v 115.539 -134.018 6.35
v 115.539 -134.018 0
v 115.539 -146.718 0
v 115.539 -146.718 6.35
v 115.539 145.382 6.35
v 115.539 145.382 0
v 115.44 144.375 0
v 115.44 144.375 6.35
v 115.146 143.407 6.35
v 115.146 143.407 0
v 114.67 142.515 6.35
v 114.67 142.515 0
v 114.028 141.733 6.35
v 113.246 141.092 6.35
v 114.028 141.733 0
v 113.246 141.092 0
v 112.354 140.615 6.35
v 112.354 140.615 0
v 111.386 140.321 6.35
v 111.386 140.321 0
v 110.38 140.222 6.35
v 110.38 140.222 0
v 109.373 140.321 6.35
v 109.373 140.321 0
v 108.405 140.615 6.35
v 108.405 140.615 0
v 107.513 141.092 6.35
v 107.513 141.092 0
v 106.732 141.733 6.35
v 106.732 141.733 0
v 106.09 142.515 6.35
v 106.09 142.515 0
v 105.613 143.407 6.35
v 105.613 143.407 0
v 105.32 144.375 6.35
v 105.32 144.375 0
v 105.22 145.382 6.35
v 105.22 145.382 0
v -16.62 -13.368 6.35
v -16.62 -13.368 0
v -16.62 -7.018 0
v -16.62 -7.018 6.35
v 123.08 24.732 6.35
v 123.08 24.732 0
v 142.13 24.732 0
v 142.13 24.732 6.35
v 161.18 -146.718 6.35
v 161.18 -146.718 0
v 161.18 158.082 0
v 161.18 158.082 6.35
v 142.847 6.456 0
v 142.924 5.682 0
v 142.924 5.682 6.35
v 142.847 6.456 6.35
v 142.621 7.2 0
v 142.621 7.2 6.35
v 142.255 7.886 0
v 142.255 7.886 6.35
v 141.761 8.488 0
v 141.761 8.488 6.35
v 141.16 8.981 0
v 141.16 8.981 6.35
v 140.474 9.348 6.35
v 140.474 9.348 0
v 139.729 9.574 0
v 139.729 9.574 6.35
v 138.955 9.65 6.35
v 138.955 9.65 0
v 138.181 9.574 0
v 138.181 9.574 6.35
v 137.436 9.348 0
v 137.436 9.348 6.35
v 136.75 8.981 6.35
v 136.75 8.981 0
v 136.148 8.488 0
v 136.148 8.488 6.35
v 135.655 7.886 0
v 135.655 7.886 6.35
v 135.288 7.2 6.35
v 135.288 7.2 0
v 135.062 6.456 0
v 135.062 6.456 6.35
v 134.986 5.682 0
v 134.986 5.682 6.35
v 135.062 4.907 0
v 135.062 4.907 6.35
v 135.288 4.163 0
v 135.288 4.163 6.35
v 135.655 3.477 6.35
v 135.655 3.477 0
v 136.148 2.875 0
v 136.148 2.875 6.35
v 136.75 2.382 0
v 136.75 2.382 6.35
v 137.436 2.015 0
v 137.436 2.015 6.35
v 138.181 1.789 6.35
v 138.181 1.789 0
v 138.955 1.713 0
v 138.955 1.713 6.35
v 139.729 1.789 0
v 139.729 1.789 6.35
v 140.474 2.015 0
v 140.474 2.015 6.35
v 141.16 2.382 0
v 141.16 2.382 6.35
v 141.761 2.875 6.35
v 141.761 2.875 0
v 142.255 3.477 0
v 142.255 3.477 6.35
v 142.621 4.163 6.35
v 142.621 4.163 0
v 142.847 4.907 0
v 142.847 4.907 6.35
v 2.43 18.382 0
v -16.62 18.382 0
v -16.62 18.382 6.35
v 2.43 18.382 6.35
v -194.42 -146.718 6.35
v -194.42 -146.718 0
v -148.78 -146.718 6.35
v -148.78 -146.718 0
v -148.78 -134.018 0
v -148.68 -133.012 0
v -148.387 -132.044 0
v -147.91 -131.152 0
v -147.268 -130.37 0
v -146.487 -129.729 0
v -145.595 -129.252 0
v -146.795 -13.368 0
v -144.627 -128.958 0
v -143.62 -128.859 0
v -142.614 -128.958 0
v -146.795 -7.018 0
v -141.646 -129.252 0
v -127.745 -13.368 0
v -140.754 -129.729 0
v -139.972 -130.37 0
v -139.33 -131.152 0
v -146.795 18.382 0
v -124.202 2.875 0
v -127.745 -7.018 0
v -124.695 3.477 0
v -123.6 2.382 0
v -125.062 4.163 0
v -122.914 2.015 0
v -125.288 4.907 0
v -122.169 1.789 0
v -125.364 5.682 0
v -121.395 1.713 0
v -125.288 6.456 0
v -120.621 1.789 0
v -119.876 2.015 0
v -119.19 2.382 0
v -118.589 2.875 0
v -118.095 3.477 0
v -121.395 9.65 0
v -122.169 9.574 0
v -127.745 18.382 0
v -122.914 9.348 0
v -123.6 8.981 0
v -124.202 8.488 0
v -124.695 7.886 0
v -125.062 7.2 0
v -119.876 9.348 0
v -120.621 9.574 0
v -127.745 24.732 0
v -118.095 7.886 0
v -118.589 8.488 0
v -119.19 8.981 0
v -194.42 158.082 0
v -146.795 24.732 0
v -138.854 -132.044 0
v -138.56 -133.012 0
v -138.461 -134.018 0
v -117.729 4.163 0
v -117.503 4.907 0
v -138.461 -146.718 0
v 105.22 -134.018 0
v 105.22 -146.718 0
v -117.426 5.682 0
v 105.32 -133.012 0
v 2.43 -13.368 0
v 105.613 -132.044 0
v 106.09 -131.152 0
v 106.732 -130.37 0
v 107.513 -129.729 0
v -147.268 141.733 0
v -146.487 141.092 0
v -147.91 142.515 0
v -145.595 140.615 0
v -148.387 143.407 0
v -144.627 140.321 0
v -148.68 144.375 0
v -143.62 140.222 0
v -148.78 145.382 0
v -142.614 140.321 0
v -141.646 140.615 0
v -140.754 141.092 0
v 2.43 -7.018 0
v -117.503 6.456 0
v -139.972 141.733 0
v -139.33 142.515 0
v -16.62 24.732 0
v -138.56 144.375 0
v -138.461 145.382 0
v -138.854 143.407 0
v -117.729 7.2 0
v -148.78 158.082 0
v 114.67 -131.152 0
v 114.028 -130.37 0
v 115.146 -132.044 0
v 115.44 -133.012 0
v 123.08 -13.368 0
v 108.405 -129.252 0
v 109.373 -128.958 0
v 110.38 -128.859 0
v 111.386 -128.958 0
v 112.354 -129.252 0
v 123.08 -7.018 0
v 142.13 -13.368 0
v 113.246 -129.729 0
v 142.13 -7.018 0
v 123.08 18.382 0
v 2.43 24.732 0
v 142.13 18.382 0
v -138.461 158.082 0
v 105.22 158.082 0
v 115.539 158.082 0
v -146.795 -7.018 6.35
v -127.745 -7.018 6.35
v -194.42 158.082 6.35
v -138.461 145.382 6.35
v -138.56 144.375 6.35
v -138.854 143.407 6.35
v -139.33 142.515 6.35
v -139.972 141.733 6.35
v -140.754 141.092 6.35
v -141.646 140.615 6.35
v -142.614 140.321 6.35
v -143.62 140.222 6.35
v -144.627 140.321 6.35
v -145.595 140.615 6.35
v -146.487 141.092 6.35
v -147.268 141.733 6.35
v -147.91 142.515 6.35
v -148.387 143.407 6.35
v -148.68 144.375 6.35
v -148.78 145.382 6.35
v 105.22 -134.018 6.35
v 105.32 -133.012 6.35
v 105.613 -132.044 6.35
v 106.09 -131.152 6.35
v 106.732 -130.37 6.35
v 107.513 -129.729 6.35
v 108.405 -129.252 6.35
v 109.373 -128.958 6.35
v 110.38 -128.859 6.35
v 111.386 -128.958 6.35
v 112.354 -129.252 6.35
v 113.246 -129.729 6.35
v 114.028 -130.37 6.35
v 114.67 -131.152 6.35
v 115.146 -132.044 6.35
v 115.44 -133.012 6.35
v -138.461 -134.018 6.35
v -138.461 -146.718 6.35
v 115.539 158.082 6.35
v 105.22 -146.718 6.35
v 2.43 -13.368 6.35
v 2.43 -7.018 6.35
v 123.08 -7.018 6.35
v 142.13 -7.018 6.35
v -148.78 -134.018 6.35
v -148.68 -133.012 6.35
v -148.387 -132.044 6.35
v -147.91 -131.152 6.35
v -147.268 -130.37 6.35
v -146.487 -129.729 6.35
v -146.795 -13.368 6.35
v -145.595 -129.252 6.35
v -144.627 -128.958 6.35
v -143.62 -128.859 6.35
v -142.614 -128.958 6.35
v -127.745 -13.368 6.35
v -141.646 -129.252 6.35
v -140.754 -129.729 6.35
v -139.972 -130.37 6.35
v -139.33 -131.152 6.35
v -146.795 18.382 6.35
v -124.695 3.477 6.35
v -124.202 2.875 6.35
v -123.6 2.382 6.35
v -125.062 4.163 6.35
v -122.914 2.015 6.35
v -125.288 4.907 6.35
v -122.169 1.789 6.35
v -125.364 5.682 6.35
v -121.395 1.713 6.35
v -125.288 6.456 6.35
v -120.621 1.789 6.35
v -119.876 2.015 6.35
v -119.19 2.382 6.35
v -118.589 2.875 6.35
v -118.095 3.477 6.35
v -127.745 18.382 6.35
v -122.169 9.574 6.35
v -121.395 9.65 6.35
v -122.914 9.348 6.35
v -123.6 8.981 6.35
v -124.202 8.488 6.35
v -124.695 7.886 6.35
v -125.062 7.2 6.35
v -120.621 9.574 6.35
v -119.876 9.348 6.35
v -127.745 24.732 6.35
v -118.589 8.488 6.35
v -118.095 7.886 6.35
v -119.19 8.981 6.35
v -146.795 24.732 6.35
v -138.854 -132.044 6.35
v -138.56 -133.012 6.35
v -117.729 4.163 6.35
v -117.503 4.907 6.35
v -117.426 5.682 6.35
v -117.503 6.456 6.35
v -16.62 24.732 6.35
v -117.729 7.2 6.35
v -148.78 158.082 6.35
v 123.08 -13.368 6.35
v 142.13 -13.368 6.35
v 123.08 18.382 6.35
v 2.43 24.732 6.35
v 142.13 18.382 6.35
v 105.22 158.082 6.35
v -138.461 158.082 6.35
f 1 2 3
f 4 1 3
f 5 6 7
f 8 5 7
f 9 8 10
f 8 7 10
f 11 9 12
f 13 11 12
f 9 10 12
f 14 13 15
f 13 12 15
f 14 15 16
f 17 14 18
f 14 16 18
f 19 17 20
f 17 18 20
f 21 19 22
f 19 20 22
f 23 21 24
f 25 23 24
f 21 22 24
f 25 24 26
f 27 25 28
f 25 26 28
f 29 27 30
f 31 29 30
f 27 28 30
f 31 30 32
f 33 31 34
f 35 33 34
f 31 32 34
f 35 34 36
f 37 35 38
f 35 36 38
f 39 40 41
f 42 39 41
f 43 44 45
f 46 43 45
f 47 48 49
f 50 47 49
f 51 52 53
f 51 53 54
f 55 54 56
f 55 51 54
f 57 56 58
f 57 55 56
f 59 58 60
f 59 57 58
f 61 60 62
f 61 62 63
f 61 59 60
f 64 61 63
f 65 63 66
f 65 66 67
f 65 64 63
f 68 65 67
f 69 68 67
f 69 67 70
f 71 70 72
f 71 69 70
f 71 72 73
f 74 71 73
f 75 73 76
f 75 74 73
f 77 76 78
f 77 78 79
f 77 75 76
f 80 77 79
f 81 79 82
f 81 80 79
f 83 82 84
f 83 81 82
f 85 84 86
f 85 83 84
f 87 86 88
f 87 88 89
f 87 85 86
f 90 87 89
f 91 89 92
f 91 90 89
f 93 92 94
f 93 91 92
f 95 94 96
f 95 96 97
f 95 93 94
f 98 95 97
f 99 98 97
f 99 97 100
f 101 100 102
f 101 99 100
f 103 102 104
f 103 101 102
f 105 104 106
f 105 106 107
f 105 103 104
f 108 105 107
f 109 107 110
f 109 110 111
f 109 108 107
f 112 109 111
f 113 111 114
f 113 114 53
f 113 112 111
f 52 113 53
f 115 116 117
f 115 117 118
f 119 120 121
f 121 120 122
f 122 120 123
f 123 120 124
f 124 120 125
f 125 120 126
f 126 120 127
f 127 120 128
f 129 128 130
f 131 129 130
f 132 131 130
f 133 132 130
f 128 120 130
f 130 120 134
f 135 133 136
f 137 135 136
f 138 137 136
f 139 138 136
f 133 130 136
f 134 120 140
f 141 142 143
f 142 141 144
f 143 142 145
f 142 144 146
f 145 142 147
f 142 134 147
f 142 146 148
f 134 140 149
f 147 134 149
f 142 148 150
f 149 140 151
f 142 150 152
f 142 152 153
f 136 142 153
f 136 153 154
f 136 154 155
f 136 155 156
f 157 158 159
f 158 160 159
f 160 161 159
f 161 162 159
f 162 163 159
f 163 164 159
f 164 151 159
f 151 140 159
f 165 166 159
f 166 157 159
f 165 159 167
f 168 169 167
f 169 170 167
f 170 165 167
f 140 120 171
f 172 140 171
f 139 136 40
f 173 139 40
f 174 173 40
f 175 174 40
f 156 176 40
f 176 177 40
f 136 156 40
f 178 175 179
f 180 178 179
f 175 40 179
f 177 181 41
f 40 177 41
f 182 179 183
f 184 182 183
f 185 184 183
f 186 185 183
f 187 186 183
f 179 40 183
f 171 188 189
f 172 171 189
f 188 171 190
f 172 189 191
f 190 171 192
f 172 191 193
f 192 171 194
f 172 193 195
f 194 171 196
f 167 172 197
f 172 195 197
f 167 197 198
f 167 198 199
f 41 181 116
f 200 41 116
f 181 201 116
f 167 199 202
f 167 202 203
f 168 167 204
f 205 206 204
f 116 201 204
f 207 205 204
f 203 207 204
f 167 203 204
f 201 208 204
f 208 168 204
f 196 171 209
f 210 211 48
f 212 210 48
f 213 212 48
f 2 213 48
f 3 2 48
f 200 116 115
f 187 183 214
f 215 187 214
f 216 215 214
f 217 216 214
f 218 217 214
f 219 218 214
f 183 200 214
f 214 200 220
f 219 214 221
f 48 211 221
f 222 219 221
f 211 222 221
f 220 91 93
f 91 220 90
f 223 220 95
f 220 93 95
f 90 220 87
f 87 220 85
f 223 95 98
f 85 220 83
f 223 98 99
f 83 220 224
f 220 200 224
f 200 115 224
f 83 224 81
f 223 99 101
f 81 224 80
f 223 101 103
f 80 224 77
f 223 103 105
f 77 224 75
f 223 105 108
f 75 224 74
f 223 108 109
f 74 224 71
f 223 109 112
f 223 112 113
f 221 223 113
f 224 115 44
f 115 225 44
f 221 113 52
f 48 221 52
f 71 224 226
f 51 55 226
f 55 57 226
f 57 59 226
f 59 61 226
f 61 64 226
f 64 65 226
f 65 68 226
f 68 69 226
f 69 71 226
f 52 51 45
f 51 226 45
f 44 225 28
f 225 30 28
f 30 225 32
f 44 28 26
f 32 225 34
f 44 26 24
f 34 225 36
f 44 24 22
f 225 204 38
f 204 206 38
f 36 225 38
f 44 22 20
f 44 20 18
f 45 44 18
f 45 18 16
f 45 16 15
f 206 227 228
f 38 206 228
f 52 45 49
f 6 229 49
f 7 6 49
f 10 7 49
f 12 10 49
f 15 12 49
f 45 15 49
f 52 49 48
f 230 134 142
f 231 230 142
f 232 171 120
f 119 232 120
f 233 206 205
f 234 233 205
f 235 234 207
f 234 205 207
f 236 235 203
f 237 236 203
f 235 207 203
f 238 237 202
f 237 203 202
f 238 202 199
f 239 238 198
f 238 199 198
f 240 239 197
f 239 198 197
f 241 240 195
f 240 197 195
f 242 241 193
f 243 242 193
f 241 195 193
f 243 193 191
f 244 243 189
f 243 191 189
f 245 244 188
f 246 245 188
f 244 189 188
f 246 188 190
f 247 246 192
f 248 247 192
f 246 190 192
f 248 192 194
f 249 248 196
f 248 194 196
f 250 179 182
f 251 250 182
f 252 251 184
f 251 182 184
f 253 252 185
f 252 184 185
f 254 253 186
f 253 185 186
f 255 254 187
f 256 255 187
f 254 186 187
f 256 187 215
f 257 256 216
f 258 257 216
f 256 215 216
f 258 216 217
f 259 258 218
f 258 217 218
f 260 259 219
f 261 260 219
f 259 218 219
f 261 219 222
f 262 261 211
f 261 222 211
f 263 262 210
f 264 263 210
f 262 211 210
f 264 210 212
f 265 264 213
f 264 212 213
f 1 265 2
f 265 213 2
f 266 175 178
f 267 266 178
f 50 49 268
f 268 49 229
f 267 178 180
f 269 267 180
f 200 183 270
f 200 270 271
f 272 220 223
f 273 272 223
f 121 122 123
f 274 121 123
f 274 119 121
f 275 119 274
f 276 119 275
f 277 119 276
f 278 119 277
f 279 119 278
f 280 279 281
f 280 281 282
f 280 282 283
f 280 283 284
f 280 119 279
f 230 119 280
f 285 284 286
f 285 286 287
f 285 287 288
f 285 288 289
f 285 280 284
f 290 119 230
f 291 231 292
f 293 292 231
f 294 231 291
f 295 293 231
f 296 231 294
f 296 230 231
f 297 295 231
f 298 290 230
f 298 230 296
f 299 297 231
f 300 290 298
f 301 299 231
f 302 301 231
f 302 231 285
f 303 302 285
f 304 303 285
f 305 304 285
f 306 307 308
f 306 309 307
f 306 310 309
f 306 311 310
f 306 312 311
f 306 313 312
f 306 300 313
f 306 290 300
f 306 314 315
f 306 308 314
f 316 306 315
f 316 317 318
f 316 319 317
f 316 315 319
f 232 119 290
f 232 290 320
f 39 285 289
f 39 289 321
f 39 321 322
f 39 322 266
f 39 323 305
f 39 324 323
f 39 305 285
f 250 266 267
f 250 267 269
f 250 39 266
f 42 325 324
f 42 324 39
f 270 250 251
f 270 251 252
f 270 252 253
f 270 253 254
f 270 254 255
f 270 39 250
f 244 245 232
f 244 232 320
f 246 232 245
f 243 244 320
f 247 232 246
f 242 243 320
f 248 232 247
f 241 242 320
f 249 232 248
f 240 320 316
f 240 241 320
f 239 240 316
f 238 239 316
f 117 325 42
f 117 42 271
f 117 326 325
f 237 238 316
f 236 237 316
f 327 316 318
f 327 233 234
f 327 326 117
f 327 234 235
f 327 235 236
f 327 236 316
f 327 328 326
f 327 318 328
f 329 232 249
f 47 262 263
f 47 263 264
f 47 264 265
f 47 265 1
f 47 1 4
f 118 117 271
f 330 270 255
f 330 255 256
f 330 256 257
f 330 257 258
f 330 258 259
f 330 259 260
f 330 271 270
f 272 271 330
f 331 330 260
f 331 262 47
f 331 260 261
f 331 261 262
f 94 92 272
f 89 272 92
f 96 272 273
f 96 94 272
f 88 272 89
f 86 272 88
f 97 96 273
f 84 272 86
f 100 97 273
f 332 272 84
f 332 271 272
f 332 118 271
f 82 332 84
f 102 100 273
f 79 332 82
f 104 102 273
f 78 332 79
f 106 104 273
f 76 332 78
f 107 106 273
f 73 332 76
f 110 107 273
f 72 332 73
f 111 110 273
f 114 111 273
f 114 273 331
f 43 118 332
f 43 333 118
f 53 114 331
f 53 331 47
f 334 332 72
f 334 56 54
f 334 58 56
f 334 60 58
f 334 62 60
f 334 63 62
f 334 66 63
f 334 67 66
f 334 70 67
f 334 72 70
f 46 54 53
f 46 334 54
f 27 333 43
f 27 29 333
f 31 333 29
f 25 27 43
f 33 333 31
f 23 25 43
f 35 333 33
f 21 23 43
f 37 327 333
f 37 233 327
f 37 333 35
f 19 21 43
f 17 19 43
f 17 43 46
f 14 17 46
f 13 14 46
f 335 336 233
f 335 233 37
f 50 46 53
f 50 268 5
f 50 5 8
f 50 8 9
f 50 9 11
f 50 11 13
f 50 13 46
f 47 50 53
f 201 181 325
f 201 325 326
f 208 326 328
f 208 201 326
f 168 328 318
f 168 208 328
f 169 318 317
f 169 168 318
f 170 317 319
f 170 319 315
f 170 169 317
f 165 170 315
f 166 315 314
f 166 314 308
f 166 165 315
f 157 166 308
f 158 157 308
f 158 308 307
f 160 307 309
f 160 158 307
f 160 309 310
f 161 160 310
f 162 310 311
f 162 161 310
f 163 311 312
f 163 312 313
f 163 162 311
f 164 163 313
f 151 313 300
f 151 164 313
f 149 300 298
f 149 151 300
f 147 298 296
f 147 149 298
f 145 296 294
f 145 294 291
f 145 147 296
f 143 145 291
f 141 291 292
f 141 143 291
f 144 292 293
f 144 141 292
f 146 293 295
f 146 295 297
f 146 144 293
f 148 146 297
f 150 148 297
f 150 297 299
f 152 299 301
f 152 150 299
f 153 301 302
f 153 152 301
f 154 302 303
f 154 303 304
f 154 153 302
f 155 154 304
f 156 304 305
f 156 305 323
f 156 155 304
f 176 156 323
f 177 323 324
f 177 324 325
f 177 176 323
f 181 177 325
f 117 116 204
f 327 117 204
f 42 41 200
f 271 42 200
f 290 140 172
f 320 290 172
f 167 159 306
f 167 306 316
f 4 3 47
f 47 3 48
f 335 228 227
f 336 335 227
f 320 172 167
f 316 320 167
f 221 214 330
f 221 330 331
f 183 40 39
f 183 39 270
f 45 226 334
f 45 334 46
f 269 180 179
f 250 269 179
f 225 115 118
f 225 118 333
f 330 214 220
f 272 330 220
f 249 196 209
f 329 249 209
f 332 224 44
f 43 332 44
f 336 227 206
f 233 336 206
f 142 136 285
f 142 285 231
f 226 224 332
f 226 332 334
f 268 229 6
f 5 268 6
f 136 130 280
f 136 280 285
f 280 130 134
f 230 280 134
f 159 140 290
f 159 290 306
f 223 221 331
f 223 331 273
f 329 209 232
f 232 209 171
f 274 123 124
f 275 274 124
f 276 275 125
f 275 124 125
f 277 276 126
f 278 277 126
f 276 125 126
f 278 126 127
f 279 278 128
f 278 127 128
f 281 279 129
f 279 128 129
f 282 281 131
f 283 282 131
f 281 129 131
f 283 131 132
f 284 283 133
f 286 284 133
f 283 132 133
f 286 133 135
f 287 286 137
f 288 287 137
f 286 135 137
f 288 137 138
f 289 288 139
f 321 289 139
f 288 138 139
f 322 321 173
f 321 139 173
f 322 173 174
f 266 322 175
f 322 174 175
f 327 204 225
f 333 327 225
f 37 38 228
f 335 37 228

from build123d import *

# Parameters (mm, degrees)
F0_W     = 19.05
F0_H     = 6.35
F0_R     = 3.96875
F1_DEPTH = 6.35


with BuildPart() as f1:
    # F0 (on Top) → F1 (new body)
    with BuildSketch(Plane.XY):
        with BuildLine():
            Line((-194.420185, 158.081577), (-194.420185, -146.718423))
            Line((-194.420185, -146.718423), (-148.77956, -146.718423))
            Line((-148.77956, -146.718423), (-148.77956, -134.018423))
            ThreePointArc((-148.77956, -134.018423), (-143.620185, -128.859048), (-138.46081, -134.018423))
            Line((-138.46081, -134.018423), (-138.46081, -146.718423))
            Line((-138.46081, -146.718423), (105.22044, -146.718423))
            Line((105.22044, -146.718423), (105.22044, -134.018423))
            ThreePointArc((105.22044, -134.018423), (110.379815, -128.859048), (115.53919, -134.018423))
            Line((115.53919, -134.018423), (115.53919, -146.718423))
            Line((115.53919, -146.718423), (161.179815, -146.718423))
            Line((161.179815, -146.718423), (161.179815, 158.081577))
            Line((161.179815, 158.081577), (115.53919, 158.081577))
            Line((115.53919, 158.081577), (115.53919, 145.381577))
            ThreePointArc((115.53919, 145.381577), (110.379815, 140.222202), (105.22044, 145.381577))
            Line((105.22044, 145.381577), (105.22044, 158.081577))
            Line((105.22044, 158.081577), (-138.46081, 158.081577))
            Line((-138.46081, 158.081577), (-138.46081, 145.381577))
            ThreePointArc((-138.46081, 145.381577), (-143.620185, 140.222202), (-148.77956, 145.381577))
            Line((-148.77956, 145.381577), (-148.77956, 158.081577))
            Line((-148.77956, 158.081577), (-194.420185, 158.081577))
        make_face()
        with Locations((-137.270185, -10.193423)):
            Rectangle(F0_W, F0_H, mode=Mode.SUBTRACT)
        with Locations((-121.395185, 5.681577)):
            Circle(F0_R, mode=Mode.SUBTRACT)
        with Locations((-7.095185, -10.193423)):
            Rectangle(F0_W, F0_H, mode=Mode.SUBTRACT)
        with Locations((132.604815, -10.193423)):
            Rectangle(F0_W, F0_H, mode=Mode.SUBTRACT)
        with Locations((-137.270185, 21.556577)):
            Rectangle(F0_W, F0_H, mode=Mode.SUBTRACT)
        with Locations((-7.095185, 21.556577)):
            Rectangle(F0_W, F0_H, mode=Mode.SUBTRACT)
        with Locations((132.604815, 21.556577)):
            Rectangle(F0_W, F0_H, mode=Mode.SUBTRACT)
        with Locations((138.954815, 5.681577)):
            Circle(F0_R, mode=Mode.SUBTRACT)
    extrude(amount=F1_DEPTH)


solid = f1.part
